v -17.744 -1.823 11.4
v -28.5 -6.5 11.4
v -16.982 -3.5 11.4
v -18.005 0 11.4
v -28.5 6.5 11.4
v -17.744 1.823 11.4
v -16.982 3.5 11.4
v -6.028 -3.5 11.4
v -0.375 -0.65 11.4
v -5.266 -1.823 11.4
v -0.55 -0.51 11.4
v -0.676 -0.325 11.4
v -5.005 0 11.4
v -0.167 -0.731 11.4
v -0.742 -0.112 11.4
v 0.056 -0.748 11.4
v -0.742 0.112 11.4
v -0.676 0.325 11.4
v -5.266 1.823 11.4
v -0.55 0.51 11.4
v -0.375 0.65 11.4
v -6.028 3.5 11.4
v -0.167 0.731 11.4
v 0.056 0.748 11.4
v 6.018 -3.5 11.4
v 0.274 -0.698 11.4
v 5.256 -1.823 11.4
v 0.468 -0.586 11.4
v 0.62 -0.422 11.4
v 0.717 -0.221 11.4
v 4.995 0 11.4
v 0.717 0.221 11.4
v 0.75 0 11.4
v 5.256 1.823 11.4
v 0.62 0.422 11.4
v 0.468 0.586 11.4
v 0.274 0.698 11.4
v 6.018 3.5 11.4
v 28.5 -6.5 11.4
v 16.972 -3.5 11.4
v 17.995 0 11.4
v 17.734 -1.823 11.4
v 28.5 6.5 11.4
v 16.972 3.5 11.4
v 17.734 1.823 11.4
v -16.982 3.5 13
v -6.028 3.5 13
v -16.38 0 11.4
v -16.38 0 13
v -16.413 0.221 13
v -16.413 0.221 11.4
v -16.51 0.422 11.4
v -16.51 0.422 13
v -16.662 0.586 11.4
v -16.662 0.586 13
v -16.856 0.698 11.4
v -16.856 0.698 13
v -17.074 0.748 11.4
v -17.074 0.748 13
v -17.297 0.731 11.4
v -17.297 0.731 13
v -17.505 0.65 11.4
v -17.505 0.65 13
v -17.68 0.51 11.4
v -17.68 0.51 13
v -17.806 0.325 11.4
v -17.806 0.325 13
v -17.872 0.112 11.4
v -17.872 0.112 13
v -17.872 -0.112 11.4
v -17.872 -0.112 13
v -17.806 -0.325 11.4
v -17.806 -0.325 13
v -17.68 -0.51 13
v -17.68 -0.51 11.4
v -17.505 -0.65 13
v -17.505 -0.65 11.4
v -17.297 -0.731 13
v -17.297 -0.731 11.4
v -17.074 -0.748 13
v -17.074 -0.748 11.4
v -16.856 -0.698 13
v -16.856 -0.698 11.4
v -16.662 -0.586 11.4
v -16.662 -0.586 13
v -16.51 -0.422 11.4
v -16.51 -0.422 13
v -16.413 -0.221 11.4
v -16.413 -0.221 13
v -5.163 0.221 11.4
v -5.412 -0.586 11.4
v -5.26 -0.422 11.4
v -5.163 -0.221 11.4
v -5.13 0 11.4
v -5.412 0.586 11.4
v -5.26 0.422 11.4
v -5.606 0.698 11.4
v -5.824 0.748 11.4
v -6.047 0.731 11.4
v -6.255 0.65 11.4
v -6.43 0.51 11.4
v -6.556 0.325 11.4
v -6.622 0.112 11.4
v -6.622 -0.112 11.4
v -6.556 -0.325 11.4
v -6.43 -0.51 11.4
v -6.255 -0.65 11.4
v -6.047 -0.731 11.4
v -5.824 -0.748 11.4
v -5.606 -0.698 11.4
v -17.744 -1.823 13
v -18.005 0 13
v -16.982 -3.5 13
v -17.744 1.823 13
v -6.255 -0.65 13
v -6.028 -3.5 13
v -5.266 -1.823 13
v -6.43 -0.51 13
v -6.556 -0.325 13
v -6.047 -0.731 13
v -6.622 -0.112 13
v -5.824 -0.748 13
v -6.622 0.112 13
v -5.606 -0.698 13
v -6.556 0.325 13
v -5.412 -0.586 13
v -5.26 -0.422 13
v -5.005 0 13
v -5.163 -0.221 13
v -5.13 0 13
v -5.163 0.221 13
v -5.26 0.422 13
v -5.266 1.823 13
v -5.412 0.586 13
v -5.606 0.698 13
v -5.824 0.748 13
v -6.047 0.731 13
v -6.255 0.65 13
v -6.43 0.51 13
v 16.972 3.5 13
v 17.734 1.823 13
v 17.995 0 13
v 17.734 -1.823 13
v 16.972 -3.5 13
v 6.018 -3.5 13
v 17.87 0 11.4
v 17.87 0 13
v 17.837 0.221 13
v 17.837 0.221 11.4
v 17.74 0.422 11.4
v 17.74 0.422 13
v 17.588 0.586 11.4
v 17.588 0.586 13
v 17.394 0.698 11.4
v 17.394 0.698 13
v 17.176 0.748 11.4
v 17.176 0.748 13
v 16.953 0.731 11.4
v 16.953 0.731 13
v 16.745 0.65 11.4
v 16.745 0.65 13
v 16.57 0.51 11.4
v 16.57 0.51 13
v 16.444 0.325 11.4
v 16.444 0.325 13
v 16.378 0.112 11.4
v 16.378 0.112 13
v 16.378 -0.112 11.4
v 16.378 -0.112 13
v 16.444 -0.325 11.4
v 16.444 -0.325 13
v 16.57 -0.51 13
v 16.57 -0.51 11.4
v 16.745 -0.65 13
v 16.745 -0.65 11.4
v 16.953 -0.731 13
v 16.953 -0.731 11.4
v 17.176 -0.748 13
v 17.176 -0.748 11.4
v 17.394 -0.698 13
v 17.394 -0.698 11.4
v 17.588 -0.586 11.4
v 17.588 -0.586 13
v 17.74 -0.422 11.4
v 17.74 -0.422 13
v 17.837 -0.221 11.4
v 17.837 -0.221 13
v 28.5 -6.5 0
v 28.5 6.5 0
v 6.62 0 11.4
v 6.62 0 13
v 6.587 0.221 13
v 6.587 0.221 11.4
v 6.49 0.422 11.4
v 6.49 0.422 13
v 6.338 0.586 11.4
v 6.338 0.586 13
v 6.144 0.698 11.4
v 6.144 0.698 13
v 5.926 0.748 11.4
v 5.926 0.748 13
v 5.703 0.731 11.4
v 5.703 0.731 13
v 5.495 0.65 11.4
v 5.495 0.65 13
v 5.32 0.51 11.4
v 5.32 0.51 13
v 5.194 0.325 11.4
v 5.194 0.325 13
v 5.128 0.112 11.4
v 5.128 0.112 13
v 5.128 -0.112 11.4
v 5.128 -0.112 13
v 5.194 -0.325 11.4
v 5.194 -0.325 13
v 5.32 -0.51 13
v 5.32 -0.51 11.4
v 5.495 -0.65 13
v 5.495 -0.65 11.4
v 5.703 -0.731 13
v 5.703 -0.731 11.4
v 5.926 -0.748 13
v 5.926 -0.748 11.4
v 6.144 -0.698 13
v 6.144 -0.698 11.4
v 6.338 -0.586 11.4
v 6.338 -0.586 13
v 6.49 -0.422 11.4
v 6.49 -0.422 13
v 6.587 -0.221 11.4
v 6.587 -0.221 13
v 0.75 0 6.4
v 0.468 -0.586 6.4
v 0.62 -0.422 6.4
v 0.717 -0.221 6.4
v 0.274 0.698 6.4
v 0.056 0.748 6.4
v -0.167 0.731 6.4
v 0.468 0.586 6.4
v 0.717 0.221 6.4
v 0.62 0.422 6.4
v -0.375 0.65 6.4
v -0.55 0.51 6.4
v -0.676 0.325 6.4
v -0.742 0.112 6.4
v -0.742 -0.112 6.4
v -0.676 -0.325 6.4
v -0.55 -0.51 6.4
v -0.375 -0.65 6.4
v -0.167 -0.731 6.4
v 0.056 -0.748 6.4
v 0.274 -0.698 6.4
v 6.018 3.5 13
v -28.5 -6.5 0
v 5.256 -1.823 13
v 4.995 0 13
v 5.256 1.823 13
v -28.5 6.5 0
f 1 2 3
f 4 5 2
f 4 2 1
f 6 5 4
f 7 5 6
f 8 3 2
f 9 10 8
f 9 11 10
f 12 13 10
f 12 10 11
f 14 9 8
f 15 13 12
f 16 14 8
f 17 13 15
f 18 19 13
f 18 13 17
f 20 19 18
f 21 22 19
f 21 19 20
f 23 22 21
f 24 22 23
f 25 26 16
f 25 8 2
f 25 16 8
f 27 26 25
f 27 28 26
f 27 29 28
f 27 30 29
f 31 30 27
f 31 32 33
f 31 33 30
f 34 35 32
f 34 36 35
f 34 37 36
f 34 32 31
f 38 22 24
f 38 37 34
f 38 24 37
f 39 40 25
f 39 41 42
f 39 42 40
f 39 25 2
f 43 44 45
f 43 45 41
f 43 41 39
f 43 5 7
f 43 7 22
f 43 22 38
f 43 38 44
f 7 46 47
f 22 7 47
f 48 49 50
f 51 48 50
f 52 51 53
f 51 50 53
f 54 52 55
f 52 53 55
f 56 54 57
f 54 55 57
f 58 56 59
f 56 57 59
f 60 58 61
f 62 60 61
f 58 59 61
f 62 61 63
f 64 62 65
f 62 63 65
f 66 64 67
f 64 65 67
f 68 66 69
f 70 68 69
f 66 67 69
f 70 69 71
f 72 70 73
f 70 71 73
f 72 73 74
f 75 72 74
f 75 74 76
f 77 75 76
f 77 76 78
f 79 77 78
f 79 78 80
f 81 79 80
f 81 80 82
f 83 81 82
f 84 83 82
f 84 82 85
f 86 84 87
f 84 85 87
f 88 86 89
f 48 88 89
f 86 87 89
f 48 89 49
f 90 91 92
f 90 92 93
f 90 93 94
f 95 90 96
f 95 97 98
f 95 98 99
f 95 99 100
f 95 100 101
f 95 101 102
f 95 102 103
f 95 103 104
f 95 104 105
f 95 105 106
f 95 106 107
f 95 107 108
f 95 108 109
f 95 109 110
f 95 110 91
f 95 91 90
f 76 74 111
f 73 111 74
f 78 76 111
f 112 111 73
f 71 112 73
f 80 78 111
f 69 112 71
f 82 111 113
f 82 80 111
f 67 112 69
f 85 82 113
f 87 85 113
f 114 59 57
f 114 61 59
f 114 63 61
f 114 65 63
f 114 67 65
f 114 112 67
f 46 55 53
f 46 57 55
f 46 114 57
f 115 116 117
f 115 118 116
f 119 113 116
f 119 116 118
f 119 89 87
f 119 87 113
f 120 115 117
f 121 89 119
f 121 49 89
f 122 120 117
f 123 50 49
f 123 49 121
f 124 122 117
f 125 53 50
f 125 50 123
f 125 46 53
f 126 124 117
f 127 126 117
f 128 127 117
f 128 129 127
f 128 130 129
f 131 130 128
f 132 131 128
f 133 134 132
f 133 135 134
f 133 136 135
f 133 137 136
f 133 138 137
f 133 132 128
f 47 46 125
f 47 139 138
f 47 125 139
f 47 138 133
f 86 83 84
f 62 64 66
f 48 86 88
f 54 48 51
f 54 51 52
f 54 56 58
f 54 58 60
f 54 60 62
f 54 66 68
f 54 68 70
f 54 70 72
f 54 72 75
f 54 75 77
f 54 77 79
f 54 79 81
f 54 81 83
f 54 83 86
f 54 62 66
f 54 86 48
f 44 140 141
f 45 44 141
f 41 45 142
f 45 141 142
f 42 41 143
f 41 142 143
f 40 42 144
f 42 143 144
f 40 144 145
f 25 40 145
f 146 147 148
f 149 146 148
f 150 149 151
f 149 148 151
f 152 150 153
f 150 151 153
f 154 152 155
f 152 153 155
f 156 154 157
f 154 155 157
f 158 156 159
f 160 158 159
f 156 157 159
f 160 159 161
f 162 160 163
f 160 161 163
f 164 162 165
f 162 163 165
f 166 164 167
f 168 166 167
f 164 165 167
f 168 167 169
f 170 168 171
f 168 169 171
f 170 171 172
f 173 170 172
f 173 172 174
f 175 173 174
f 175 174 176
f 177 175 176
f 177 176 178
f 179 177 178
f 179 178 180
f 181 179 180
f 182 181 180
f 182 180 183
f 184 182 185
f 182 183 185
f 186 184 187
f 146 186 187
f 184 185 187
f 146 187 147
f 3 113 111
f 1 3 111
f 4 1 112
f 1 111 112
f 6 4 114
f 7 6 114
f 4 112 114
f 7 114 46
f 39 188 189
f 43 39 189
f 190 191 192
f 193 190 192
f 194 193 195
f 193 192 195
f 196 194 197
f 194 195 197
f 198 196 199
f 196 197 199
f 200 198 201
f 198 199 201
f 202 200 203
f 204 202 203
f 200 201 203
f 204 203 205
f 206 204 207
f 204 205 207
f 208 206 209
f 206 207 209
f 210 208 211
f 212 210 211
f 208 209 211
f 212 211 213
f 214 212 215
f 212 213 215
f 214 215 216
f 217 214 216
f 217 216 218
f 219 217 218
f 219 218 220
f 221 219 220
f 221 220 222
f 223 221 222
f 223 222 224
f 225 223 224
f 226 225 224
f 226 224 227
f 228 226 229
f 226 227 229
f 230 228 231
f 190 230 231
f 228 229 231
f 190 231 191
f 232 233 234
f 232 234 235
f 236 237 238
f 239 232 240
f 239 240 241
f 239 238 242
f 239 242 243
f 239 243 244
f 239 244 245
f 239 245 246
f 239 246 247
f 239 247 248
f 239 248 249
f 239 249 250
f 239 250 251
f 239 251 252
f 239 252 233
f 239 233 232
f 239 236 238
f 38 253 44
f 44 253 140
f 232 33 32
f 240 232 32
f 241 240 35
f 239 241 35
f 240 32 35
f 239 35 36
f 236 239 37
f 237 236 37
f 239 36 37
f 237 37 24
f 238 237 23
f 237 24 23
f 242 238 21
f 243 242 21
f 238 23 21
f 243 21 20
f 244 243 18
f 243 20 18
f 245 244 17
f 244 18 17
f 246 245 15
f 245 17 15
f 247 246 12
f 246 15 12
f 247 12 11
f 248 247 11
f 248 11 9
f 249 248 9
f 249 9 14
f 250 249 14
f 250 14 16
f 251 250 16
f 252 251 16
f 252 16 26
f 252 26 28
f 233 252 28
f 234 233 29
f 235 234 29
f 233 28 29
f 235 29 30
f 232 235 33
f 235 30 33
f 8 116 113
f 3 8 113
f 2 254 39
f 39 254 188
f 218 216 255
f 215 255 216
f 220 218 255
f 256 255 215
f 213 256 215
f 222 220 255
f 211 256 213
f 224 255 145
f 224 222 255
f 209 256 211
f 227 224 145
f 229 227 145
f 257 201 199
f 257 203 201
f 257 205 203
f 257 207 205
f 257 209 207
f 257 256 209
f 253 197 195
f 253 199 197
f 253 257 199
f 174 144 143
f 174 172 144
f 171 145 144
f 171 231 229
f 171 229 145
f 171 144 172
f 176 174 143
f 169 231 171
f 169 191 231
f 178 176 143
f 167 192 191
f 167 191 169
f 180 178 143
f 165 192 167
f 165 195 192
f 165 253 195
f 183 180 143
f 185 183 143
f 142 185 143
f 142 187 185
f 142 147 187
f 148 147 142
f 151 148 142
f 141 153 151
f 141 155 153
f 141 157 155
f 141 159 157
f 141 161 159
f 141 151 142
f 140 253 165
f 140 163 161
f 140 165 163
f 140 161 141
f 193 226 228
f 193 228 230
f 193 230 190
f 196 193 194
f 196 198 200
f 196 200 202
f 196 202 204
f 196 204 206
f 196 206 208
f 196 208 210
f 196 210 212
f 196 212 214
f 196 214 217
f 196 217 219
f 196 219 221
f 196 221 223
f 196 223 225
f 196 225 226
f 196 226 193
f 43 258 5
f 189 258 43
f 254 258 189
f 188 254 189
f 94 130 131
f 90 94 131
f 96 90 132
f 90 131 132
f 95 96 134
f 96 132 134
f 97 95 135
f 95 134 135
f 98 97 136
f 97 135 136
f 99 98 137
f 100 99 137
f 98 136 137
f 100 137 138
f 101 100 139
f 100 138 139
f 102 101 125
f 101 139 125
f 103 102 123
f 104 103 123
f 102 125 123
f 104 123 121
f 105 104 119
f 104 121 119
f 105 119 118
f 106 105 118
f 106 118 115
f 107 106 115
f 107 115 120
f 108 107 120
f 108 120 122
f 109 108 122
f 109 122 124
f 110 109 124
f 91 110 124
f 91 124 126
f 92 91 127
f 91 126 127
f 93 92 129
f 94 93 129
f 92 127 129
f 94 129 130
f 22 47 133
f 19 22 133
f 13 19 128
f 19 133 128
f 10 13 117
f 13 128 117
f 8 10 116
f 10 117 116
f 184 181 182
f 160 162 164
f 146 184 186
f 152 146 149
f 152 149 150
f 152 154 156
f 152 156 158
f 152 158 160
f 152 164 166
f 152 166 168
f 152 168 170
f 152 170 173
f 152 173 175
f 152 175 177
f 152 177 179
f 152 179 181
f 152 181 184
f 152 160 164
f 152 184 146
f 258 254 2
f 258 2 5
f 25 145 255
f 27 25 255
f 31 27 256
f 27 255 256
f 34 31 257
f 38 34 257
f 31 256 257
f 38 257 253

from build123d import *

# Parameters (mm, degrees)
F0_W     = 57
F0_H     = 13
F1_DEPTH = 13
F2_W     = 57
F2_H     = 13
F2_R     = 0.75
F3_DEPTH = 1.6
F4_ANGLE = -180
F5_ANGLE = -180
F6_R     = 0.75
F7_DEPTH = 5


with BuildPart() as f1:
    # F0 (on Top) → F1 (new body)
    with BuildSketch(Plane.XY):
        Rectangle(F0_W, F0_H)
    extrude(amount=F1_DEPTH)

    # F2 (on face) → F3 (cut)
    with BuildSketch(Plane.XY.offset(13)):
        Rectangle(F2_W, F2_H)
        with BuildLine():
            ThreePointArc((-6.027774, 3.5), (-5.005, 0), (-6.027774, -3.5))
            Line((-6.027774, -3.5), (-16.982226, -3.5))
            ThreePointArc((-16.982226, -3.5), (-18.005, 0), (-16.982226, 3.5))
            Line((-16.982226, 3.5), (-6.027774, 3.5))
        make_face(mode=Mode.SUBTRACT)
        with BuildLine():
            ThreePointArc((6.017774, -3.5), (4.995, 0), (6.017774, 3.5))
            Line((6.017774, 3.5), (16.972226, 3.5))
            ThreePointArc((16.972226, 3.5), (17.995, 0), (16.972226, -3.5))
            Line((16.972226, -3.5), (6.017774, -3.5))
        make_face(mode=Mode.SUBTRACT)
        with Locations((-17.13, 0)):
            Circle(F2_R)
        with Locations((-5.88, 0)):
            Circle(F2_R)
        with Locations((5.87, 0)):
            Circle(F2_R)
        with Locations((17.12, 0)):
            Circle(F2_R)
    extrude(amount=-F3_DEPTH, mode=Mode.SUBTRACT)


with BuildPart() as f1_1:
    # F4: moved
    add(f1.part.rotate(Axis((0, 6.5, 0), (1, 0, 0)), F4_ANGLE))


with BuildPart() as f1_2:
    # F5: moved
    add(f1_1.part.rotate(Axis((0, 6.5, 0), (1, 0, 0)), F5_ANGLE))

    # F6 (on face) → F7 (cut)
    with BuildSketch(Plane.XY.offset(11.4)):
        Circle(F6_R)
    extrude(amount=-F7_DEPTH, mode=Mode.SUBTRACT)


solid = f1_2.part
